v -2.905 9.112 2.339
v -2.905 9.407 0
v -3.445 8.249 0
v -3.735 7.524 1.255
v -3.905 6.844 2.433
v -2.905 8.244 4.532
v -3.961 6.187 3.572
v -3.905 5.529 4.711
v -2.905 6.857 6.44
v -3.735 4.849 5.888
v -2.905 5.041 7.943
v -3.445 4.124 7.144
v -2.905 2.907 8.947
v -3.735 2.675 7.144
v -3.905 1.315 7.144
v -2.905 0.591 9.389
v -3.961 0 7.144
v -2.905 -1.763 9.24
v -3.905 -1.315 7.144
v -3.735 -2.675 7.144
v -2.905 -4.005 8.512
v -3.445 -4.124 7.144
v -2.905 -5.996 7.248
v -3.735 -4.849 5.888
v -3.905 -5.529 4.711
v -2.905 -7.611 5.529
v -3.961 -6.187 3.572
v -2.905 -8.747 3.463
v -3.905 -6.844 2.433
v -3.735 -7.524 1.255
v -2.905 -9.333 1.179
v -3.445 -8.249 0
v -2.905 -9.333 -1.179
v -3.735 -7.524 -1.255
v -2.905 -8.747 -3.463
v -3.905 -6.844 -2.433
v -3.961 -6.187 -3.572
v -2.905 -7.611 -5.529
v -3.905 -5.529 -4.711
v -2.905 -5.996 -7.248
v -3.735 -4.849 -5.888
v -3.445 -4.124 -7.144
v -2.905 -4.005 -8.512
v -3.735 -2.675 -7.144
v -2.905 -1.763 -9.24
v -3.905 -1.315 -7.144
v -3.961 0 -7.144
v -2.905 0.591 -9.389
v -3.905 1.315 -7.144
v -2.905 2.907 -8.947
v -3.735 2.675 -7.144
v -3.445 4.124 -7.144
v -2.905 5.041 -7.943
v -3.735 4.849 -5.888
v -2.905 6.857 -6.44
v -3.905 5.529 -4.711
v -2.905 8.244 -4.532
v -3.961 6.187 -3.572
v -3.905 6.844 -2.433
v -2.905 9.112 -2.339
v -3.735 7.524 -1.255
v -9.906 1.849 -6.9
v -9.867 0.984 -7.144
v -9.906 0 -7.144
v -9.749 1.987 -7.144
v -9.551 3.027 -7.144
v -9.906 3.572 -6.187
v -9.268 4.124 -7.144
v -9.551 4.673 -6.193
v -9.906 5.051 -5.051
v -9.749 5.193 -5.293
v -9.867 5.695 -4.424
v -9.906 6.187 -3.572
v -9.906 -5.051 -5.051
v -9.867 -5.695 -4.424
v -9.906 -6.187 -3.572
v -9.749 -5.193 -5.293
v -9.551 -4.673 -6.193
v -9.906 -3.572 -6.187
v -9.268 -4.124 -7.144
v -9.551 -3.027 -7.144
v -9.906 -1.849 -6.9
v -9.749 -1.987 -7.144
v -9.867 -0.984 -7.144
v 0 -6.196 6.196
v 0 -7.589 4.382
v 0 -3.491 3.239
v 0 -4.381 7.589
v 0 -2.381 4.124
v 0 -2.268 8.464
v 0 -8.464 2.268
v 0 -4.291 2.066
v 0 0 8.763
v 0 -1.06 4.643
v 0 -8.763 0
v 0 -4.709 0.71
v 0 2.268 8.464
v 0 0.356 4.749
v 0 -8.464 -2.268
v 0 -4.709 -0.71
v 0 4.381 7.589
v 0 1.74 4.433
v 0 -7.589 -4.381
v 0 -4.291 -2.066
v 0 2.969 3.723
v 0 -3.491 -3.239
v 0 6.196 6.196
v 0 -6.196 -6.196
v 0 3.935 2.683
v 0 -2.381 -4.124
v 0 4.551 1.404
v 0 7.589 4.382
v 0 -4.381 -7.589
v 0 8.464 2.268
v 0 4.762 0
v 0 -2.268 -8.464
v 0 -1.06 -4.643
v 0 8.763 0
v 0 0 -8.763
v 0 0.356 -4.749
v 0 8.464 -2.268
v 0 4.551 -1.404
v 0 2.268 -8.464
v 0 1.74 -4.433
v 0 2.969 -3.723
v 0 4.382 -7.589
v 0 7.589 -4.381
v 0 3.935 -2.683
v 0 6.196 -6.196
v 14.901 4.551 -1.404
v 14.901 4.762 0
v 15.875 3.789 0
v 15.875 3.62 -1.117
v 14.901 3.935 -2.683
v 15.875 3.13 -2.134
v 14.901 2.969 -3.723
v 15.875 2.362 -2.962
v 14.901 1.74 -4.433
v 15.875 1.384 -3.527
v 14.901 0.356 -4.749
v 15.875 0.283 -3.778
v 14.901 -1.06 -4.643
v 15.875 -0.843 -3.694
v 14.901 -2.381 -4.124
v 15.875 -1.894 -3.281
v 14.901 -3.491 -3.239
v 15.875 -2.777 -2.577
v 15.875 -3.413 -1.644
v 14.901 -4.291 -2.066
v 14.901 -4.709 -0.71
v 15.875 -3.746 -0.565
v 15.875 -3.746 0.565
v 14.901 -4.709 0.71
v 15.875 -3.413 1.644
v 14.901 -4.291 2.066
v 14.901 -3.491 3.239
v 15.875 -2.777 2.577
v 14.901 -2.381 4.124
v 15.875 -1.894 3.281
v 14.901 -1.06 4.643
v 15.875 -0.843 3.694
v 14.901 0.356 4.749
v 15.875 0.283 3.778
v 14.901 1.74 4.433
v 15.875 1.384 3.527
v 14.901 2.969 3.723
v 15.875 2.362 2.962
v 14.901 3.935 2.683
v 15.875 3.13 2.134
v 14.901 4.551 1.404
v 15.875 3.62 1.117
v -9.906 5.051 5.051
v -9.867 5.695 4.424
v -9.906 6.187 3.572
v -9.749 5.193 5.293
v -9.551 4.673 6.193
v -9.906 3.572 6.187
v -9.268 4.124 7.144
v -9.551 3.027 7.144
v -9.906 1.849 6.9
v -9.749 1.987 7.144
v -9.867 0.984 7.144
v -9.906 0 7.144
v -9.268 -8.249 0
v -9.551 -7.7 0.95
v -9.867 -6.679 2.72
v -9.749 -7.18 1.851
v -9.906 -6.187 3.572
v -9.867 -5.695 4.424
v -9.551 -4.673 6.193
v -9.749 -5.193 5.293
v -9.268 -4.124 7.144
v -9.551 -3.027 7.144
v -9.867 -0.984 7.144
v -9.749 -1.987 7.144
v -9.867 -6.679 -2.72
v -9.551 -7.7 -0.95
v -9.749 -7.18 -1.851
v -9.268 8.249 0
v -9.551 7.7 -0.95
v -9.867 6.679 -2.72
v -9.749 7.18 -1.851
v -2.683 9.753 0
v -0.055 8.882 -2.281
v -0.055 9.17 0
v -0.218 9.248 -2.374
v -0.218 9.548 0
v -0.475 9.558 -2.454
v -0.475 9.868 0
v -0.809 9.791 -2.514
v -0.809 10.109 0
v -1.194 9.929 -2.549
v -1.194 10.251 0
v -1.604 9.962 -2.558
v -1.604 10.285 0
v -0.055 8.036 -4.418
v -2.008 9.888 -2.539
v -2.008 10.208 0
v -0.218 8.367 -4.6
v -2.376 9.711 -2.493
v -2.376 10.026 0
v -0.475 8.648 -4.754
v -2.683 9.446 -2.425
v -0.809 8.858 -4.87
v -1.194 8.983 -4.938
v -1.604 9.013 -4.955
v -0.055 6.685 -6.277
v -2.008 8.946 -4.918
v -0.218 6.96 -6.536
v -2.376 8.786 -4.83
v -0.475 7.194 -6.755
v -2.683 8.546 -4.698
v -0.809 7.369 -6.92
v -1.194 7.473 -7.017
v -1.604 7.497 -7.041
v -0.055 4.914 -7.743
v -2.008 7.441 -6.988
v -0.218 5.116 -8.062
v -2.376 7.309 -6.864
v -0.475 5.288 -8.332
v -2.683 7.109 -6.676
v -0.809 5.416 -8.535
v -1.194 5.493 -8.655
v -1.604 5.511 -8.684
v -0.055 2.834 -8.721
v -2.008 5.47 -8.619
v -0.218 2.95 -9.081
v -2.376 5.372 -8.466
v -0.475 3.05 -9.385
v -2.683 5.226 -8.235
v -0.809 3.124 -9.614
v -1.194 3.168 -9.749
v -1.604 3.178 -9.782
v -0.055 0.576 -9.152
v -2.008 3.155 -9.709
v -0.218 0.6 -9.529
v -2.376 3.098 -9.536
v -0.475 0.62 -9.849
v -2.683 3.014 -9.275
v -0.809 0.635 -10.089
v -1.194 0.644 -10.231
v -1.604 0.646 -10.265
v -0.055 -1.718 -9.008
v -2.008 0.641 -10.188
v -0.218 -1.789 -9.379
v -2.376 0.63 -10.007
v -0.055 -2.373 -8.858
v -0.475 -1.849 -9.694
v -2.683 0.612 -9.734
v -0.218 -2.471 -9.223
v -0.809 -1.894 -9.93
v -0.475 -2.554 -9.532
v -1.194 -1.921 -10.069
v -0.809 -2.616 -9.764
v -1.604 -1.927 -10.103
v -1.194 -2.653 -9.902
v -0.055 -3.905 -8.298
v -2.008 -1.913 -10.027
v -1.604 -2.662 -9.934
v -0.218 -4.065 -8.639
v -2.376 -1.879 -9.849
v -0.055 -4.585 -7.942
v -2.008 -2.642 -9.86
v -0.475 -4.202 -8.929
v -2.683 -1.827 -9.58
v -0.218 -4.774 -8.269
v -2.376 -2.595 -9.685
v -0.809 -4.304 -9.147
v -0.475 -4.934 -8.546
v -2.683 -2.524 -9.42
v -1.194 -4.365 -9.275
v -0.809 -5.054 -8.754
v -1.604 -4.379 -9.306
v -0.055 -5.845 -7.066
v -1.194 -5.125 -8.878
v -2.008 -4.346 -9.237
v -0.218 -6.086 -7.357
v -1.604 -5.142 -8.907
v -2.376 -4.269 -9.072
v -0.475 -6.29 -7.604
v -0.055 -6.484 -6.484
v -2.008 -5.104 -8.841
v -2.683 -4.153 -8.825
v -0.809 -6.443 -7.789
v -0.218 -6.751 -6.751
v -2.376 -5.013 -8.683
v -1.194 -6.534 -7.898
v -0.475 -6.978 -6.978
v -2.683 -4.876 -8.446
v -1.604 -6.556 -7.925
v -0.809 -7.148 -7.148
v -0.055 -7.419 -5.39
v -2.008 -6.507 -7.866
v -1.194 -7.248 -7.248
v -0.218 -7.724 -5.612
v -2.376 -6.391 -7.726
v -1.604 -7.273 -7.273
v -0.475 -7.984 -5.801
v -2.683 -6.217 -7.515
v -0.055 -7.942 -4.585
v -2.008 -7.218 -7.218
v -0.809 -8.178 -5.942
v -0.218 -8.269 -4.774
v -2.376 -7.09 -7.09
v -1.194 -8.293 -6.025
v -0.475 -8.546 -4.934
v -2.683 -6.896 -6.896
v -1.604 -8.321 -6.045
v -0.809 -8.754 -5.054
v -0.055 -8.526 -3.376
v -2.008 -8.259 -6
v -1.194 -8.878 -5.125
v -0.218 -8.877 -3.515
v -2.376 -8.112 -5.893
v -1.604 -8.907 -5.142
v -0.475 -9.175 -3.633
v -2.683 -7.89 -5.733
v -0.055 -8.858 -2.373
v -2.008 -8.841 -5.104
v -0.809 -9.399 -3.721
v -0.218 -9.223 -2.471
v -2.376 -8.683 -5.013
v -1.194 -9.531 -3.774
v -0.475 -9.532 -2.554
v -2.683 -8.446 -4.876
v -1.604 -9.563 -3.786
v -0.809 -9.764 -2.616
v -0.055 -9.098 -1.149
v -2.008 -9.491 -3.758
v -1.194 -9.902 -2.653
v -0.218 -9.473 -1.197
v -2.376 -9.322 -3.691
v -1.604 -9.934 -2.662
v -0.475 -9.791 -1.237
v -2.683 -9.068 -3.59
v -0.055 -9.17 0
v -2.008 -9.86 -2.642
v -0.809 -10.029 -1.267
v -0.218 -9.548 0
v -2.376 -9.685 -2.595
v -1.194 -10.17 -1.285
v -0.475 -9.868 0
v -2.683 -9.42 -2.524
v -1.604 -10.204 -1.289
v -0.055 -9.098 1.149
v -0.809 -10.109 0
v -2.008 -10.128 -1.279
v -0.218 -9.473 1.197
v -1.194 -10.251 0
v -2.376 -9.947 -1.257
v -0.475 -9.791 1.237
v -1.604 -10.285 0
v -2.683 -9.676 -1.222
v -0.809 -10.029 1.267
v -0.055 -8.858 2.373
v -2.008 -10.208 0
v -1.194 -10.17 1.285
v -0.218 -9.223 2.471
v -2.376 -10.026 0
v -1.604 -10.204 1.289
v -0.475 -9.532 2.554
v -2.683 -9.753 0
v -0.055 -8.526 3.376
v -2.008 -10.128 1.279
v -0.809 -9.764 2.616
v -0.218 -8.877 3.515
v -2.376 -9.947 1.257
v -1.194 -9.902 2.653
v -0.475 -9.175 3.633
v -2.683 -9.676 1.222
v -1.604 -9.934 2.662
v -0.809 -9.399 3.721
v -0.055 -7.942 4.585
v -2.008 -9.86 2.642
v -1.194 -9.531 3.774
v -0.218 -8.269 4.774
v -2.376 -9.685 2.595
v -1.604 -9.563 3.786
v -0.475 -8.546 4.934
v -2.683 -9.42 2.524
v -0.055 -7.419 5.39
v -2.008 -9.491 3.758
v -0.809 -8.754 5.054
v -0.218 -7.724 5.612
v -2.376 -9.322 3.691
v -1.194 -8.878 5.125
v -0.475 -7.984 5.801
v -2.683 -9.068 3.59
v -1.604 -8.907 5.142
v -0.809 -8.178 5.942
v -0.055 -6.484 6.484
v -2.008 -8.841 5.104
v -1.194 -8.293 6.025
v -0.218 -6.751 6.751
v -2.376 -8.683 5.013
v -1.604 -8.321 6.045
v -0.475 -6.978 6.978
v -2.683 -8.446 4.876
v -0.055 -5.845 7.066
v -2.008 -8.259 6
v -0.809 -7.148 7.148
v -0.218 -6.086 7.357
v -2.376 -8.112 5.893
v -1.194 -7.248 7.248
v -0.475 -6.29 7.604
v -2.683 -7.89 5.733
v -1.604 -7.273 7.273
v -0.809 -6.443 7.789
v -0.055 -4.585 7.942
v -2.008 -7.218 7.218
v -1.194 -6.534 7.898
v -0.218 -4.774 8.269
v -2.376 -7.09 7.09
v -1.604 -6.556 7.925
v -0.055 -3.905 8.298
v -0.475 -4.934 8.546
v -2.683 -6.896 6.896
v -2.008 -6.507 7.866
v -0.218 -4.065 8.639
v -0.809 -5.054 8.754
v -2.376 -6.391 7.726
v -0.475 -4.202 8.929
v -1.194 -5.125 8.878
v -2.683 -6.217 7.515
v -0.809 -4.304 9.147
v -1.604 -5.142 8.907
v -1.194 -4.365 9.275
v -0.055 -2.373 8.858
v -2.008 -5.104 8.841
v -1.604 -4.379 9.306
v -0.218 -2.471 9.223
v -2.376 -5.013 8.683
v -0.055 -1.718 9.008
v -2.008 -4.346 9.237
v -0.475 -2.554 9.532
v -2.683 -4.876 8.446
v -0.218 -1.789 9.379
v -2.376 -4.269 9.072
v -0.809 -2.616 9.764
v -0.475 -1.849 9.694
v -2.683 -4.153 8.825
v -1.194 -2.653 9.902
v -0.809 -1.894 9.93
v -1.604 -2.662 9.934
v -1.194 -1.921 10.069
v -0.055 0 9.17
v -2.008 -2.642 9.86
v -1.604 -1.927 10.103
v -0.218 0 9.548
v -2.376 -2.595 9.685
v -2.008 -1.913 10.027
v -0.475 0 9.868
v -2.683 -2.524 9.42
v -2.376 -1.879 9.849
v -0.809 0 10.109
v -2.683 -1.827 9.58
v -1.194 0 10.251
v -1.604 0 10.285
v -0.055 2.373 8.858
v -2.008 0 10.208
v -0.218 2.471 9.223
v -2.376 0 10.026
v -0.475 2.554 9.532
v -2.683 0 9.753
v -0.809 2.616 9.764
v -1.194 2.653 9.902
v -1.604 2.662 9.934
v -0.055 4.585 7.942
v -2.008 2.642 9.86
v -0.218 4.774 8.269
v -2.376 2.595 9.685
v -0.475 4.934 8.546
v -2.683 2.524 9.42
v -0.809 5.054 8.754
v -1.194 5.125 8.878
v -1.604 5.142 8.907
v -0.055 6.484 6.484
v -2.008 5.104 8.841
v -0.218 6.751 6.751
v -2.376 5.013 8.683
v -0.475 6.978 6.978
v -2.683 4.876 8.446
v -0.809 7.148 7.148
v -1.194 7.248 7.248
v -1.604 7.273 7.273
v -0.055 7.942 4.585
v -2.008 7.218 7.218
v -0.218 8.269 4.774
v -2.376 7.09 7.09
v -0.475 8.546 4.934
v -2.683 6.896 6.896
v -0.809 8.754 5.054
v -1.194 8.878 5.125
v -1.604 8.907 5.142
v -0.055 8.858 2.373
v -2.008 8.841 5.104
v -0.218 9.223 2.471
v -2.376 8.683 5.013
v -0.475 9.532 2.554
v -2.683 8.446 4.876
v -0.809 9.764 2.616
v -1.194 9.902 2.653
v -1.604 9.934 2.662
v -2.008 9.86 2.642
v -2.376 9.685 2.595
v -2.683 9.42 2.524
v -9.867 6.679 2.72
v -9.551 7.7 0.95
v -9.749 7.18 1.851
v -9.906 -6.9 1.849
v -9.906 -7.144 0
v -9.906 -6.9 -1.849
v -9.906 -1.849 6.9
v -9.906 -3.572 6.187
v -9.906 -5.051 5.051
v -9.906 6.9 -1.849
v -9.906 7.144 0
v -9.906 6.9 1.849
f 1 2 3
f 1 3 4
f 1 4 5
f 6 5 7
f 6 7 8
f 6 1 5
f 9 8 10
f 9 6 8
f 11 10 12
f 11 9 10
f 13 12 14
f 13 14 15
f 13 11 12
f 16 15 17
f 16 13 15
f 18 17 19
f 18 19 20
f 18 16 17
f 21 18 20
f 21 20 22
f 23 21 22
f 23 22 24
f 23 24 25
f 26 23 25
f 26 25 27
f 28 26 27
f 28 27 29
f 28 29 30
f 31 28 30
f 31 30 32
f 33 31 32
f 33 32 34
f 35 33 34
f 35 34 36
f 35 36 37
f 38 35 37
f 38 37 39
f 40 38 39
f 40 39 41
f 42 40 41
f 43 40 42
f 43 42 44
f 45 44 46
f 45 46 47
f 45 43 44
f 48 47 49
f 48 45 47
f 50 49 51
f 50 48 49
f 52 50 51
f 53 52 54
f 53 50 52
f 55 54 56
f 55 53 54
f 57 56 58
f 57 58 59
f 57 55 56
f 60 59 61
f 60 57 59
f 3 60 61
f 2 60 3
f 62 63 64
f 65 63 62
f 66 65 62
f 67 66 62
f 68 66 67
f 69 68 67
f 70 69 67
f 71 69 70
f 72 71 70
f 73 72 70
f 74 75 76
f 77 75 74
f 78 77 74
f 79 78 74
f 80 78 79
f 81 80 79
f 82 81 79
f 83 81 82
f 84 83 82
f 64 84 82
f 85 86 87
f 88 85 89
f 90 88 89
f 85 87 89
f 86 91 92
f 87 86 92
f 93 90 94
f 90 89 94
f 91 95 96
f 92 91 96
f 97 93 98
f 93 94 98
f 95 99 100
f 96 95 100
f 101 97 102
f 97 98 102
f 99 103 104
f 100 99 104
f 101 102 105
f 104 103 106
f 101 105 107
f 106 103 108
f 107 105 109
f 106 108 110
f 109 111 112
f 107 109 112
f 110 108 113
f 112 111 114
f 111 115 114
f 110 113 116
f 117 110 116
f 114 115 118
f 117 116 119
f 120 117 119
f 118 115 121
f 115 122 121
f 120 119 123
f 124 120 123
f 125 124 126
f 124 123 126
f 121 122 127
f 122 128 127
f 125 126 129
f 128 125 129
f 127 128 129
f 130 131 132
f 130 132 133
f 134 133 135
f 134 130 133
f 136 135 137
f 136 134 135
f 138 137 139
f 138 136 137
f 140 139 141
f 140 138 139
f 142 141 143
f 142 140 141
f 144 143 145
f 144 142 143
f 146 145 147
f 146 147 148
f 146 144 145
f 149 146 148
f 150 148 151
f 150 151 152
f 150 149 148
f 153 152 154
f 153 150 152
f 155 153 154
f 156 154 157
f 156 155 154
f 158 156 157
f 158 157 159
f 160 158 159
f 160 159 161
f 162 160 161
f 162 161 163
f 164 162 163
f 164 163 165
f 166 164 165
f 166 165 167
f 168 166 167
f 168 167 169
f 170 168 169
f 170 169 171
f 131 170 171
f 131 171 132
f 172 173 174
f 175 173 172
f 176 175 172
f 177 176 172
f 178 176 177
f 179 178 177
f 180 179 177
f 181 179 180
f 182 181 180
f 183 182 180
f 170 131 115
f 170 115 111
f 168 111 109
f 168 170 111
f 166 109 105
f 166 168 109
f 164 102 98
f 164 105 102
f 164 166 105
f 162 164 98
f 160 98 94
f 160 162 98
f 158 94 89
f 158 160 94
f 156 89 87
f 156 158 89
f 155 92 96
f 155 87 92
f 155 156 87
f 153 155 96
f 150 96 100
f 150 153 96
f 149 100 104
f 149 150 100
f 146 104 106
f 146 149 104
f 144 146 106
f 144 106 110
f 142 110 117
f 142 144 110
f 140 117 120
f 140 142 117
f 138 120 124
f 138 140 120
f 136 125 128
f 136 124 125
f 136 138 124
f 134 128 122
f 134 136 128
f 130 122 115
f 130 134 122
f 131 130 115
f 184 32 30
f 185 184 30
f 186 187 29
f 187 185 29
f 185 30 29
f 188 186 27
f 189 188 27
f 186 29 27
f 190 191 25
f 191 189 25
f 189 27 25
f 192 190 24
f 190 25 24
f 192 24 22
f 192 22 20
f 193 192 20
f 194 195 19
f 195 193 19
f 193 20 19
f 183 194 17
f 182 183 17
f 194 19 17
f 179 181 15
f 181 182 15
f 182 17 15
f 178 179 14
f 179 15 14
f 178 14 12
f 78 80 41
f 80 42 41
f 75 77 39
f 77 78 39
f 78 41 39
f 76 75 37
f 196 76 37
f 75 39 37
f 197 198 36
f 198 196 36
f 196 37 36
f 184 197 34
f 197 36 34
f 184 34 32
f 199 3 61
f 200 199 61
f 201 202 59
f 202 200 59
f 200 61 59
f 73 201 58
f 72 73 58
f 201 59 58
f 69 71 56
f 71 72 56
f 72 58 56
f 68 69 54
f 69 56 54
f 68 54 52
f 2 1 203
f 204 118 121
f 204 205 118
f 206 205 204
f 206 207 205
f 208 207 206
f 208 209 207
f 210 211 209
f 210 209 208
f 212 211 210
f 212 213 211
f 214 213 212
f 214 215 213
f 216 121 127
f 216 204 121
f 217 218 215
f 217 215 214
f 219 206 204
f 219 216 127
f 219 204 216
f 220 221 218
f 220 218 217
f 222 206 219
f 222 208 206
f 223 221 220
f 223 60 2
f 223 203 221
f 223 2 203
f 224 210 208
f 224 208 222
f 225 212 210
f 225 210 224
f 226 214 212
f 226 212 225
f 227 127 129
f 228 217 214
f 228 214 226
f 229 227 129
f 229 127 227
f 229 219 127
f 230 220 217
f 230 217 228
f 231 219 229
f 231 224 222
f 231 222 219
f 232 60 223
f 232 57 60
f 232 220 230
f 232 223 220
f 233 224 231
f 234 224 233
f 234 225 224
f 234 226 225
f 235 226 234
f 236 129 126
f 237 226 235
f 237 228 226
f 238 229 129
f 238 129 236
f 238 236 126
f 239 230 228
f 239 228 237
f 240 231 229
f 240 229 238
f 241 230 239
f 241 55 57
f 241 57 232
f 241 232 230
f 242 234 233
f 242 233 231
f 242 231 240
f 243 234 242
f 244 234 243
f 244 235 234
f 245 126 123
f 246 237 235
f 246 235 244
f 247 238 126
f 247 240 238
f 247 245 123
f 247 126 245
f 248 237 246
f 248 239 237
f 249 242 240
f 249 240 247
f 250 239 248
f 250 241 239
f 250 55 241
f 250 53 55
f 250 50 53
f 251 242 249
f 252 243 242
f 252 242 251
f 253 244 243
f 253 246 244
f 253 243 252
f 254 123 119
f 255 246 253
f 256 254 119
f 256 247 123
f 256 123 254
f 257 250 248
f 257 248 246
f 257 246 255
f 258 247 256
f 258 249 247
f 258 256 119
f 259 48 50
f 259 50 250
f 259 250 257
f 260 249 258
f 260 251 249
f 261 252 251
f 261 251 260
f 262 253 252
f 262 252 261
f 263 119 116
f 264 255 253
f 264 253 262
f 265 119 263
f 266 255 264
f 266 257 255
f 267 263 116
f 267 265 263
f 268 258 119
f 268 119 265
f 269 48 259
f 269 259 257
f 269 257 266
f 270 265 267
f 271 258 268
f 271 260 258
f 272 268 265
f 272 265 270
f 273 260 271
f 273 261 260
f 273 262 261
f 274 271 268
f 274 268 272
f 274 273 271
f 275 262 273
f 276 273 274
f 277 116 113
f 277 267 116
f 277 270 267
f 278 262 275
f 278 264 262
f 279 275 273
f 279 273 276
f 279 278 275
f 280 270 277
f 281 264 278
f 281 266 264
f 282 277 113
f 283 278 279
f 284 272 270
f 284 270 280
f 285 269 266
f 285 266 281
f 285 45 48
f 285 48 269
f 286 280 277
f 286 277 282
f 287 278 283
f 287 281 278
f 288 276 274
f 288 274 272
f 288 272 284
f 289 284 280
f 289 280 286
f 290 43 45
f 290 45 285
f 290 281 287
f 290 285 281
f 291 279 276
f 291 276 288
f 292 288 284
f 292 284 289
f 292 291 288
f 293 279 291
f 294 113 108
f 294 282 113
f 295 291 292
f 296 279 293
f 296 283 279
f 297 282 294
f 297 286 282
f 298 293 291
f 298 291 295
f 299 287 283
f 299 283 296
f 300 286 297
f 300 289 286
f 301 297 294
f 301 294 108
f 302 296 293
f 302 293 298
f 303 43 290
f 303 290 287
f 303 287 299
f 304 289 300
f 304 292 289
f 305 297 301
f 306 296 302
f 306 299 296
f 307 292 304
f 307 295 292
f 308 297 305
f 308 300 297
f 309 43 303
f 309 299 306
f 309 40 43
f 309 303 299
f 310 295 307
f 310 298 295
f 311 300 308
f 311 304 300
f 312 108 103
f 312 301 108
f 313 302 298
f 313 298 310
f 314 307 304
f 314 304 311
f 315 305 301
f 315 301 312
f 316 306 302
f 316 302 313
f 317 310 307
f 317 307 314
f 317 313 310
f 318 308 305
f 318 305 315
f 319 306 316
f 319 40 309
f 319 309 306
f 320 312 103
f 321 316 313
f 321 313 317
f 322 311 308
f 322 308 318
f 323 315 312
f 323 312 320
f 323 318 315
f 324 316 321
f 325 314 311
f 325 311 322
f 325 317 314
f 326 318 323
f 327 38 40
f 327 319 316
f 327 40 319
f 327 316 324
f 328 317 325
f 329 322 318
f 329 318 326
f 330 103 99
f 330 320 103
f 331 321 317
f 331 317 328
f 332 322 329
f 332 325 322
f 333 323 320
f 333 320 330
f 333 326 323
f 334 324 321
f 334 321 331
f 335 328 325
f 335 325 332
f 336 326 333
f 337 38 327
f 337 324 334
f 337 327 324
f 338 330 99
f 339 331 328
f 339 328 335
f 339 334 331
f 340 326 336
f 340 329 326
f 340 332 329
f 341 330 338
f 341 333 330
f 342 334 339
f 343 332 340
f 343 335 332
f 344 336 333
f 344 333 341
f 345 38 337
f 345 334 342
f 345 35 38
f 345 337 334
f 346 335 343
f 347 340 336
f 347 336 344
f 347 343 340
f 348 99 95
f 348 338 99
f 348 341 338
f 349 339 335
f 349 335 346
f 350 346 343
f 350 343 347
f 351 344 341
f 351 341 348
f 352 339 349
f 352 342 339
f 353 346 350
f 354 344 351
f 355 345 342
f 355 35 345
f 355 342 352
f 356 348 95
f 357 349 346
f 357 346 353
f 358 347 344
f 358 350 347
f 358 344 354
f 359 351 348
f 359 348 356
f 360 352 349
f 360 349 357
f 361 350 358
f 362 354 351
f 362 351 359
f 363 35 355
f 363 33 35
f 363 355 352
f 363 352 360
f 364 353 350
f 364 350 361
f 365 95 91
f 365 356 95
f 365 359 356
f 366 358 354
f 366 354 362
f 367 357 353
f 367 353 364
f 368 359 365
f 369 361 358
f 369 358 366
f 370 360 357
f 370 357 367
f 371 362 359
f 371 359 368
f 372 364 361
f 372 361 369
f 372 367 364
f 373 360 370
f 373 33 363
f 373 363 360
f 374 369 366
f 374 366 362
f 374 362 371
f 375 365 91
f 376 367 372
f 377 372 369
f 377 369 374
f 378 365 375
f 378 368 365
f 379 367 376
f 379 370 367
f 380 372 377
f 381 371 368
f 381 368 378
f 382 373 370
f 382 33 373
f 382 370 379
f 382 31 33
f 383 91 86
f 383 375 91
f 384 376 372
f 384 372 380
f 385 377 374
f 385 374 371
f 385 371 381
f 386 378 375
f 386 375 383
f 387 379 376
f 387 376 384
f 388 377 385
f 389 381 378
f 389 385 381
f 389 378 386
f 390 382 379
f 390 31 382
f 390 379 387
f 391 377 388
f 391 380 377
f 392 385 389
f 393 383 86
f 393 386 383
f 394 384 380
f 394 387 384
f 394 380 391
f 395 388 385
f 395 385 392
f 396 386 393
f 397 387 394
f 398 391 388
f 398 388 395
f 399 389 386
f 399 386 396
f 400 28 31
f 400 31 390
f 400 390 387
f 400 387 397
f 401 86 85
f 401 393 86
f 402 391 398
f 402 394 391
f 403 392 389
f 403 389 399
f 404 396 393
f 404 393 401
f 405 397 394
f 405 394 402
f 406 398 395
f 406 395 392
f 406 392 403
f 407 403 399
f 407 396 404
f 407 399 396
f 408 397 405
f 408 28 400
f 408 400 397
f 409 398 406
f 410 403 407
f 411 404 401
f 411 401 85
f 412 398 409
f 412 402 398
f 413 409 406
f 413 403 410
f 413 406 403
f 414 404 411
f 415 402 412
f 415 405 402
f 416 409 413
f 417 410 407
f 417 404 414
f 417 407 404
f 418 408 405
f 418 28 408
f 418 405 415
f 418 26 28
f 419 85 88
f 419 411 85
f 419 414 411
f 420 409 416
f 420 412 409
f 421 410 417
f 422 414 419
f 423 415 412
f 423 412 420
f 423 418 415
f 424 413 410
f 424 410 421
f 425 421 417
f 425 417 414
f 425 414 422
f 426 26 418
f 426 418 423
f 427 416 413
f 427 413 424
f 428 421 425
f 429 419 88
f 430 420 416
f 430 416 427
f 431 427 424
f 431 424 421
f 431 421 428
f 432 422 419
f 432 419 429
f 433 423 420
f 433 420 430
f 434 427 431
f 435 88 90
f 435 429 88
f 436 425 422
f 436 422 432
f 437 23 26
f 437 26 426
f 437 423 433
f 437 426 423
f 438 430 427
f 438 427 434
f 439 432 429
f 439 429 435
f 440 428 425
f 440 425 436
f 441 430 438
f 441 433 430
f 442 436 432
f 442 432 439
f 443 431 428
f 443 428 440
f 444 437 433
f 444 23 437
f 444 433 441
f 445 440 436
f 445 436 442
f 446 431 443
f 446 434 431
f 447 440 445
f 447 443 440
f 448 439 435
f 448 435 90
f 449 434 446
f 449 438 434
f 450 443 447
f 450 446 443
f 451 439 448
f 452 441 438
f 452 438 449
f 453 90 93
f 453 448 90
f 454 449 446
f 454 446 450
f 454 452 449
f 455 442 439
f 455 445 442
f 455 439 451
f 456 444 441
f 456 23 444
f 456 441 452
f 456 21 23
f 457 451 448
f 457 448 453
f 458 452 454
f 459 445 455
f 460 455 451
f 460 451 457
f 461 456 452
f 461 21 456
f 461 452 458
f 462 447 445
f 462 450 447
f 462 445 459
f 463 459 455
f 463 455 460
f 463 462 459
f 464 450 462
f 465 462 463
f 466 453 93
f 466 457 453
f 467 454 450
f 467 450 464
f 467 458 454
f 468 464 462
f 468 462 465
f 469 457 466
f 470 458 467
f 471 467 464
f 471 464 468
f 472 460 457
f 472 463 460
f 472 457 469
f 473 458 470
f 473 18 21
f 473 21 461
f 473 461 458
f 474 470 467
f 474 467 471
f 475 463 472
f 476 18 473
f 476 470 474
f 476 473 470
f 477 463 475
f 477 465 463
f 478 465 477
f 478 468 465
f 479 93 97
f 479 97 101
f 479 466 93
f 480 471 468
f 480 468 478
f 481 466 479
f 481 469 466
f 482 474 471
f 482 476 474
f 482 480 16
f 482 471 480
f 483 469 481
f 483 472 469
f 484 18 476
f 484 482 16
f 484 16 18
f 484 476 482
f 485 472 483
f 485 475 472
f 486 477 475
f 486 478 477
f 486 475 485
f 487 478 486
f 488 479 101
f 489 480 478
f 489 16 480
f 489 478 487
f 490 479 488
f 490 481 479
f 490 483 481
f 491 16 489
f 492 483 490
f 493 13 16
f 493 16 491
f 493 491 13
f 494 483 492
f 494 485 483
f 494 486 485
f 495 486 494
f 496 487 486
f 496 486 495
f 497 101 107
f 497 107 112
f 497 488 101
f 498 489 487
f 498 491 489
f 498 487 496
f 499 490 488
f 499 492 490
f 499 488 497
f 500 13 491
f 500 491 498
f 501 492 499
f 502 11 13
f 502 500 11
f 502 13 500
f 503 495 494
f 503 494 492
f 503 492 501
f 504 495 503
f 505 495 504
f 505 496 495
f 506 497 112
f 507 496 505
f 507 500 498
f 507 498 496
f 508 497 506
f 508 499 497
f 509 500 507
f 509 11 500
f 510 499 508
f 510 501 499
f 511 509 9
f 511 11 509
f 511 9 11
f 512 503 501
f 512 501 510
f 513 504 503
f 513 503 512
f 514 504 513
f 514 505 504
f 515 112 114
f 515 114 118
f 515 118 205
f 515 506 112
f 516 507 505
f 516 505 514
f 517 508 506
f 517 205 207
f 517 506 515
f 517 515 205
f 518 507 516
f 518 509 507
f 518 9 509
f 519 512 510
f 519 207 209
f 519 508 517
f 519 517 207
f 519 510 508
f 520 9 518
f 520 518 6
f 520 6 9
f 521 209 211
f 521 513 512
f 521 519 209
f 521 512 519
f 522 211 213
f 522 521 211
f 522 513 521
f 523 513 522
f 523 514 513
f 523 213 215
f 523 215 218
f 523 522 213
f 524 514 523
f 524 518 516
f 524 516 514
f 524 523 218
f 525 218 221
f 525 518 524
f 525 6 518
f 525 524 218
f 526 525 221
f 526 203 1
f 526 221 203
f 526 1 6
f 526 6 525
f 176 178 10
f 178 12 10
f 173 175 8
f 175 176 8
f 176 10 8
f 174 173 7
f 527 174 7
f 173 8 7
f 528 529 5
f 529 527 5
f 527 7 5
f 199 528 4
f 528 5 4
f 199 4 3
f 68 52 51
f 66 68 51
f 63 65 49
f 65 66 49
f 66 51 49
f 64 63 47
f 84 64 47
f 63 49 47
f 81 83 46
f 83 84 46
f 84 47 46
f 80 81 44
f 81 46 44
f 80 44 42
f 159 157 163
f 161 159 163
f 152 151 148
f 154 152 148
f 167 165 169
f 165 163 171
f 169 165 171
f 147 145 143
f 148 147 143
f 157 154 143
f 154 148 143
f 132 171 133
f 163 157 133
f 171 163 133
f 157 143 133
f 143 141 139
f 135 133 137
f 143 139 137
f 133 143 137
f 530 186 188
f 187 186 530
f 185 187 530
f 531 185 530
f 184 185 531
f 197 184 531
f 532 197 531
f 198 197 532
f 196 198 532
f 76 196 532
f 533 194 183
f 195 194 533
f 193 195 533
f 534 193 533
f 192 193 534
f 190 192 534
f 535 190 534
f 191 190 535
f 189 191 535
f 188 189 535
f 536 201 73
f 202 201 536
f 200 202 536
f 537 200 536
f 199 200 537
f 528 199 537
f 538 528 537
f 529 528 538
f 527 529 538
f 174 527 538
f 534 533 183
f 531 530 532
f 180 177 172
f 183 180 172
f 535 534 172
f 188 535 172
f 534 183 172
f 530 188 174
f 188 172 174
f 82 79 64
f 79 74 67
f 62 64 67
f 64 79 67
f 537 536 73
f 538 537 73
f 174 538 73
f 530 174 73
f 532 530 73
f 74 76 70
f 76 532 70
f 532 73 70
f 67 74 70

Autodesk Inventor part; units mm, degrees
ref_plane "YZ Plane" through (0, 0, 0) normal (1, 0, 0) x (0, 1, 0)
ref_plane "XZ Plane" through (0, 0, 0) normal (0, 1, 0) x (-1, 0, 0)
sketch "Sketch1" plane through (0, 0, 0) normal (0, 0, 1) x (1, 0, 0)
  line L0 (-4.4577, 0) -> (-4.4577, 6.0778)
  line L1 (0, 8.763) -> (0, 4.7625)
  line L2 (2.3876, 4.7625) -> (15.875, 4.7625)
  line L3 (15.875, 4.7625) -> (15.875, 0)
  line L4 (15.875, 0) -> (-4.4577, 0)
  arc A0 (0, 8.763) -> (-2.9052, 9.4071) centre (-1.524, 8.763) ccw
  line L5 (0, -2.1146) -> (0, 12.6875) projected
  line L6 (-8.5242, 0) -> (19.9415, 0) projected
  line L7 (0, 4.7625) -> (0.0001, 4.7625)
  line L8 (0.0001, 4.7625) -> (0.0001, 4.7625)
  line L9 (0.0001, 4.7625) -> (0.7937, 4.7625)
  line L10 (0.7937, 4.7625) -> (2.3876, 4.7625)
  line L11 (-4.4577, 6.0778) -> (-2.9052, 9.4071)
  line L12 (0.0001, 4.7625) -> (2.3876, 4.7625) construction
  line L13 (2.3876, 4.7625) -> (2.3876, 0) construction
  dimension "d0" = 1.524
  dimension "d1" = 15.875
  dimension "d2" = 13.4874
  dimension "d3" = 20.574
  dimension "d4" = 9.525
  dimension "d5" = 4.4577
  dimension "d15" = 9.525
  dimension "d16" = 9.525
  dimension "d17" = 0.0001
  dimension "d18" = 1.5938
  dimension "d19" = 25
revolve "Body" add sketch "Sketch1" angle 360 about axis through (15.875, 0, 0) along (-1, 0, 0)
sketch "Sketch2" plane through (0, 0, 0) normal (1, 0, 0) x (0, 0, -1)
  line L0 (7.1438, 4.1244) -> (7.1437, -4.1244)
  line L1 (7.1437, -4.1244) -> (0, -8.2489)
  line L2 (0, -8.2489) -> (-7.1438, -4.1244)
  line L3 (-7.1438, -4.1244) -> (-7.1437, 4.1244)
  line L4 (-7.1437, 4.1244) -> (0, 8.2489)
  line L5 (0, 8.2489) -> (7.1438, 4.1244)
  point P0 (0, 0)
  point P1 (0, 0)
  dimension "d23" = 14.2875
extrude "Head" add sketch "Sketch2" against normal blind 9.906
sketch "Sketch3" plane through (0, 0, 0) normal (0, 0, 1) x (1, 0, 0)
  line L0 (-9.906, 7.1437) -> (-9.906, 8.2489)
  line L1 (-9.906, 8.2489) -> (-9.2679, 8.2489)
  line L2 (-9.2679, 8.2489) -> (-9.906, 7.1437)
  line L3 (-11.1981, 0) -> (-2.1531, 0) projected
  line L4 (-9.906, 8.2489) -> (-9.906, 4.1244) projected
  line L5 (-3.4453, 8.2489) -> (-9.906, 8.2489) projected
  point P0 (-9.906, 4.1244)
  dimension "d8" = 30
  dimension "d22" = 14.2875
revolve "Chamfer1" cut sketch "Sketch3" angle 360 about axis through (-10, 0, 0) along (1, 0, 0)
thread "Thread" size "3/8-16 UNC" class "2A" standard "ANSI Unified Screw Threads" length 13.4874
chamfer "Chamfer2" distance 0.9739 distance2 0.9739 1 edges at (15.875, -4.7625, 0) measured on face at (15.875, -1.4057, -0.0221)
ref_plane "Work Plane1" through (10.95, 0, 0) normal (0, 0, -1) x (1, 0, 0)
equation "\"d23\" = SW"
equation "\"d6\" = KOH"
equation "\"d10\" = GEL"
equation "\"d13\" = -0.5 * SPD + 0.5 * GD"
equation "\"d14\" = GUL"
equation "\"d0\" = PHH"
equation "\"d1\" = NLG"
equation "\"d2\" = GEL"
equation "\"d3\" = LADI"
equation "\"d4\" = GD"
equation "\"d5\" = 0.45 * KOH"
equation "\"d15\" = SD2"
equation "\"d16\" = BDM"
equation "\"d18\" = GAL"
equation "\"d19\" = KEWI"
equation "\"d8\" = ANG1"
equation "\"d22\" = SW0"
equation "\"NLG\" = 15.875"
equation "\"GD\" = NND"
equation "\"BDM\" = NND"
equation "\"KOH\" = 9.906"
equation "\"GEL\" = 13.4874"
equation "\"LADI\" = 20.574"
equation "\"SW\" = 14.2875"
equation "\"PHH\" = 1.524"
equation "\"SW0\" = SW"
equation "\"SPD\" = 7.5773"
equation "\"SD2\" = NND"
equation "\"SD\" = 0"
equation "\"ANG1\" = 30deg"
equation "\"KEWI\" = 25deg"
equation "\"GAL\" = 1.59385"
equation "\"GUL\" = 0.97385"
equation "\"THREADDIA\" = 9.525"
equation "\"SDH\" = SW"
equation "\"TOA\" = 30deg"
equation "\"NND\" = 9.525"
equation "\"E0\" = 1.155 * SW"
equation "\"GD1\" = 7.5773"
properties part number "92979A336" material "Steel, Mild"
